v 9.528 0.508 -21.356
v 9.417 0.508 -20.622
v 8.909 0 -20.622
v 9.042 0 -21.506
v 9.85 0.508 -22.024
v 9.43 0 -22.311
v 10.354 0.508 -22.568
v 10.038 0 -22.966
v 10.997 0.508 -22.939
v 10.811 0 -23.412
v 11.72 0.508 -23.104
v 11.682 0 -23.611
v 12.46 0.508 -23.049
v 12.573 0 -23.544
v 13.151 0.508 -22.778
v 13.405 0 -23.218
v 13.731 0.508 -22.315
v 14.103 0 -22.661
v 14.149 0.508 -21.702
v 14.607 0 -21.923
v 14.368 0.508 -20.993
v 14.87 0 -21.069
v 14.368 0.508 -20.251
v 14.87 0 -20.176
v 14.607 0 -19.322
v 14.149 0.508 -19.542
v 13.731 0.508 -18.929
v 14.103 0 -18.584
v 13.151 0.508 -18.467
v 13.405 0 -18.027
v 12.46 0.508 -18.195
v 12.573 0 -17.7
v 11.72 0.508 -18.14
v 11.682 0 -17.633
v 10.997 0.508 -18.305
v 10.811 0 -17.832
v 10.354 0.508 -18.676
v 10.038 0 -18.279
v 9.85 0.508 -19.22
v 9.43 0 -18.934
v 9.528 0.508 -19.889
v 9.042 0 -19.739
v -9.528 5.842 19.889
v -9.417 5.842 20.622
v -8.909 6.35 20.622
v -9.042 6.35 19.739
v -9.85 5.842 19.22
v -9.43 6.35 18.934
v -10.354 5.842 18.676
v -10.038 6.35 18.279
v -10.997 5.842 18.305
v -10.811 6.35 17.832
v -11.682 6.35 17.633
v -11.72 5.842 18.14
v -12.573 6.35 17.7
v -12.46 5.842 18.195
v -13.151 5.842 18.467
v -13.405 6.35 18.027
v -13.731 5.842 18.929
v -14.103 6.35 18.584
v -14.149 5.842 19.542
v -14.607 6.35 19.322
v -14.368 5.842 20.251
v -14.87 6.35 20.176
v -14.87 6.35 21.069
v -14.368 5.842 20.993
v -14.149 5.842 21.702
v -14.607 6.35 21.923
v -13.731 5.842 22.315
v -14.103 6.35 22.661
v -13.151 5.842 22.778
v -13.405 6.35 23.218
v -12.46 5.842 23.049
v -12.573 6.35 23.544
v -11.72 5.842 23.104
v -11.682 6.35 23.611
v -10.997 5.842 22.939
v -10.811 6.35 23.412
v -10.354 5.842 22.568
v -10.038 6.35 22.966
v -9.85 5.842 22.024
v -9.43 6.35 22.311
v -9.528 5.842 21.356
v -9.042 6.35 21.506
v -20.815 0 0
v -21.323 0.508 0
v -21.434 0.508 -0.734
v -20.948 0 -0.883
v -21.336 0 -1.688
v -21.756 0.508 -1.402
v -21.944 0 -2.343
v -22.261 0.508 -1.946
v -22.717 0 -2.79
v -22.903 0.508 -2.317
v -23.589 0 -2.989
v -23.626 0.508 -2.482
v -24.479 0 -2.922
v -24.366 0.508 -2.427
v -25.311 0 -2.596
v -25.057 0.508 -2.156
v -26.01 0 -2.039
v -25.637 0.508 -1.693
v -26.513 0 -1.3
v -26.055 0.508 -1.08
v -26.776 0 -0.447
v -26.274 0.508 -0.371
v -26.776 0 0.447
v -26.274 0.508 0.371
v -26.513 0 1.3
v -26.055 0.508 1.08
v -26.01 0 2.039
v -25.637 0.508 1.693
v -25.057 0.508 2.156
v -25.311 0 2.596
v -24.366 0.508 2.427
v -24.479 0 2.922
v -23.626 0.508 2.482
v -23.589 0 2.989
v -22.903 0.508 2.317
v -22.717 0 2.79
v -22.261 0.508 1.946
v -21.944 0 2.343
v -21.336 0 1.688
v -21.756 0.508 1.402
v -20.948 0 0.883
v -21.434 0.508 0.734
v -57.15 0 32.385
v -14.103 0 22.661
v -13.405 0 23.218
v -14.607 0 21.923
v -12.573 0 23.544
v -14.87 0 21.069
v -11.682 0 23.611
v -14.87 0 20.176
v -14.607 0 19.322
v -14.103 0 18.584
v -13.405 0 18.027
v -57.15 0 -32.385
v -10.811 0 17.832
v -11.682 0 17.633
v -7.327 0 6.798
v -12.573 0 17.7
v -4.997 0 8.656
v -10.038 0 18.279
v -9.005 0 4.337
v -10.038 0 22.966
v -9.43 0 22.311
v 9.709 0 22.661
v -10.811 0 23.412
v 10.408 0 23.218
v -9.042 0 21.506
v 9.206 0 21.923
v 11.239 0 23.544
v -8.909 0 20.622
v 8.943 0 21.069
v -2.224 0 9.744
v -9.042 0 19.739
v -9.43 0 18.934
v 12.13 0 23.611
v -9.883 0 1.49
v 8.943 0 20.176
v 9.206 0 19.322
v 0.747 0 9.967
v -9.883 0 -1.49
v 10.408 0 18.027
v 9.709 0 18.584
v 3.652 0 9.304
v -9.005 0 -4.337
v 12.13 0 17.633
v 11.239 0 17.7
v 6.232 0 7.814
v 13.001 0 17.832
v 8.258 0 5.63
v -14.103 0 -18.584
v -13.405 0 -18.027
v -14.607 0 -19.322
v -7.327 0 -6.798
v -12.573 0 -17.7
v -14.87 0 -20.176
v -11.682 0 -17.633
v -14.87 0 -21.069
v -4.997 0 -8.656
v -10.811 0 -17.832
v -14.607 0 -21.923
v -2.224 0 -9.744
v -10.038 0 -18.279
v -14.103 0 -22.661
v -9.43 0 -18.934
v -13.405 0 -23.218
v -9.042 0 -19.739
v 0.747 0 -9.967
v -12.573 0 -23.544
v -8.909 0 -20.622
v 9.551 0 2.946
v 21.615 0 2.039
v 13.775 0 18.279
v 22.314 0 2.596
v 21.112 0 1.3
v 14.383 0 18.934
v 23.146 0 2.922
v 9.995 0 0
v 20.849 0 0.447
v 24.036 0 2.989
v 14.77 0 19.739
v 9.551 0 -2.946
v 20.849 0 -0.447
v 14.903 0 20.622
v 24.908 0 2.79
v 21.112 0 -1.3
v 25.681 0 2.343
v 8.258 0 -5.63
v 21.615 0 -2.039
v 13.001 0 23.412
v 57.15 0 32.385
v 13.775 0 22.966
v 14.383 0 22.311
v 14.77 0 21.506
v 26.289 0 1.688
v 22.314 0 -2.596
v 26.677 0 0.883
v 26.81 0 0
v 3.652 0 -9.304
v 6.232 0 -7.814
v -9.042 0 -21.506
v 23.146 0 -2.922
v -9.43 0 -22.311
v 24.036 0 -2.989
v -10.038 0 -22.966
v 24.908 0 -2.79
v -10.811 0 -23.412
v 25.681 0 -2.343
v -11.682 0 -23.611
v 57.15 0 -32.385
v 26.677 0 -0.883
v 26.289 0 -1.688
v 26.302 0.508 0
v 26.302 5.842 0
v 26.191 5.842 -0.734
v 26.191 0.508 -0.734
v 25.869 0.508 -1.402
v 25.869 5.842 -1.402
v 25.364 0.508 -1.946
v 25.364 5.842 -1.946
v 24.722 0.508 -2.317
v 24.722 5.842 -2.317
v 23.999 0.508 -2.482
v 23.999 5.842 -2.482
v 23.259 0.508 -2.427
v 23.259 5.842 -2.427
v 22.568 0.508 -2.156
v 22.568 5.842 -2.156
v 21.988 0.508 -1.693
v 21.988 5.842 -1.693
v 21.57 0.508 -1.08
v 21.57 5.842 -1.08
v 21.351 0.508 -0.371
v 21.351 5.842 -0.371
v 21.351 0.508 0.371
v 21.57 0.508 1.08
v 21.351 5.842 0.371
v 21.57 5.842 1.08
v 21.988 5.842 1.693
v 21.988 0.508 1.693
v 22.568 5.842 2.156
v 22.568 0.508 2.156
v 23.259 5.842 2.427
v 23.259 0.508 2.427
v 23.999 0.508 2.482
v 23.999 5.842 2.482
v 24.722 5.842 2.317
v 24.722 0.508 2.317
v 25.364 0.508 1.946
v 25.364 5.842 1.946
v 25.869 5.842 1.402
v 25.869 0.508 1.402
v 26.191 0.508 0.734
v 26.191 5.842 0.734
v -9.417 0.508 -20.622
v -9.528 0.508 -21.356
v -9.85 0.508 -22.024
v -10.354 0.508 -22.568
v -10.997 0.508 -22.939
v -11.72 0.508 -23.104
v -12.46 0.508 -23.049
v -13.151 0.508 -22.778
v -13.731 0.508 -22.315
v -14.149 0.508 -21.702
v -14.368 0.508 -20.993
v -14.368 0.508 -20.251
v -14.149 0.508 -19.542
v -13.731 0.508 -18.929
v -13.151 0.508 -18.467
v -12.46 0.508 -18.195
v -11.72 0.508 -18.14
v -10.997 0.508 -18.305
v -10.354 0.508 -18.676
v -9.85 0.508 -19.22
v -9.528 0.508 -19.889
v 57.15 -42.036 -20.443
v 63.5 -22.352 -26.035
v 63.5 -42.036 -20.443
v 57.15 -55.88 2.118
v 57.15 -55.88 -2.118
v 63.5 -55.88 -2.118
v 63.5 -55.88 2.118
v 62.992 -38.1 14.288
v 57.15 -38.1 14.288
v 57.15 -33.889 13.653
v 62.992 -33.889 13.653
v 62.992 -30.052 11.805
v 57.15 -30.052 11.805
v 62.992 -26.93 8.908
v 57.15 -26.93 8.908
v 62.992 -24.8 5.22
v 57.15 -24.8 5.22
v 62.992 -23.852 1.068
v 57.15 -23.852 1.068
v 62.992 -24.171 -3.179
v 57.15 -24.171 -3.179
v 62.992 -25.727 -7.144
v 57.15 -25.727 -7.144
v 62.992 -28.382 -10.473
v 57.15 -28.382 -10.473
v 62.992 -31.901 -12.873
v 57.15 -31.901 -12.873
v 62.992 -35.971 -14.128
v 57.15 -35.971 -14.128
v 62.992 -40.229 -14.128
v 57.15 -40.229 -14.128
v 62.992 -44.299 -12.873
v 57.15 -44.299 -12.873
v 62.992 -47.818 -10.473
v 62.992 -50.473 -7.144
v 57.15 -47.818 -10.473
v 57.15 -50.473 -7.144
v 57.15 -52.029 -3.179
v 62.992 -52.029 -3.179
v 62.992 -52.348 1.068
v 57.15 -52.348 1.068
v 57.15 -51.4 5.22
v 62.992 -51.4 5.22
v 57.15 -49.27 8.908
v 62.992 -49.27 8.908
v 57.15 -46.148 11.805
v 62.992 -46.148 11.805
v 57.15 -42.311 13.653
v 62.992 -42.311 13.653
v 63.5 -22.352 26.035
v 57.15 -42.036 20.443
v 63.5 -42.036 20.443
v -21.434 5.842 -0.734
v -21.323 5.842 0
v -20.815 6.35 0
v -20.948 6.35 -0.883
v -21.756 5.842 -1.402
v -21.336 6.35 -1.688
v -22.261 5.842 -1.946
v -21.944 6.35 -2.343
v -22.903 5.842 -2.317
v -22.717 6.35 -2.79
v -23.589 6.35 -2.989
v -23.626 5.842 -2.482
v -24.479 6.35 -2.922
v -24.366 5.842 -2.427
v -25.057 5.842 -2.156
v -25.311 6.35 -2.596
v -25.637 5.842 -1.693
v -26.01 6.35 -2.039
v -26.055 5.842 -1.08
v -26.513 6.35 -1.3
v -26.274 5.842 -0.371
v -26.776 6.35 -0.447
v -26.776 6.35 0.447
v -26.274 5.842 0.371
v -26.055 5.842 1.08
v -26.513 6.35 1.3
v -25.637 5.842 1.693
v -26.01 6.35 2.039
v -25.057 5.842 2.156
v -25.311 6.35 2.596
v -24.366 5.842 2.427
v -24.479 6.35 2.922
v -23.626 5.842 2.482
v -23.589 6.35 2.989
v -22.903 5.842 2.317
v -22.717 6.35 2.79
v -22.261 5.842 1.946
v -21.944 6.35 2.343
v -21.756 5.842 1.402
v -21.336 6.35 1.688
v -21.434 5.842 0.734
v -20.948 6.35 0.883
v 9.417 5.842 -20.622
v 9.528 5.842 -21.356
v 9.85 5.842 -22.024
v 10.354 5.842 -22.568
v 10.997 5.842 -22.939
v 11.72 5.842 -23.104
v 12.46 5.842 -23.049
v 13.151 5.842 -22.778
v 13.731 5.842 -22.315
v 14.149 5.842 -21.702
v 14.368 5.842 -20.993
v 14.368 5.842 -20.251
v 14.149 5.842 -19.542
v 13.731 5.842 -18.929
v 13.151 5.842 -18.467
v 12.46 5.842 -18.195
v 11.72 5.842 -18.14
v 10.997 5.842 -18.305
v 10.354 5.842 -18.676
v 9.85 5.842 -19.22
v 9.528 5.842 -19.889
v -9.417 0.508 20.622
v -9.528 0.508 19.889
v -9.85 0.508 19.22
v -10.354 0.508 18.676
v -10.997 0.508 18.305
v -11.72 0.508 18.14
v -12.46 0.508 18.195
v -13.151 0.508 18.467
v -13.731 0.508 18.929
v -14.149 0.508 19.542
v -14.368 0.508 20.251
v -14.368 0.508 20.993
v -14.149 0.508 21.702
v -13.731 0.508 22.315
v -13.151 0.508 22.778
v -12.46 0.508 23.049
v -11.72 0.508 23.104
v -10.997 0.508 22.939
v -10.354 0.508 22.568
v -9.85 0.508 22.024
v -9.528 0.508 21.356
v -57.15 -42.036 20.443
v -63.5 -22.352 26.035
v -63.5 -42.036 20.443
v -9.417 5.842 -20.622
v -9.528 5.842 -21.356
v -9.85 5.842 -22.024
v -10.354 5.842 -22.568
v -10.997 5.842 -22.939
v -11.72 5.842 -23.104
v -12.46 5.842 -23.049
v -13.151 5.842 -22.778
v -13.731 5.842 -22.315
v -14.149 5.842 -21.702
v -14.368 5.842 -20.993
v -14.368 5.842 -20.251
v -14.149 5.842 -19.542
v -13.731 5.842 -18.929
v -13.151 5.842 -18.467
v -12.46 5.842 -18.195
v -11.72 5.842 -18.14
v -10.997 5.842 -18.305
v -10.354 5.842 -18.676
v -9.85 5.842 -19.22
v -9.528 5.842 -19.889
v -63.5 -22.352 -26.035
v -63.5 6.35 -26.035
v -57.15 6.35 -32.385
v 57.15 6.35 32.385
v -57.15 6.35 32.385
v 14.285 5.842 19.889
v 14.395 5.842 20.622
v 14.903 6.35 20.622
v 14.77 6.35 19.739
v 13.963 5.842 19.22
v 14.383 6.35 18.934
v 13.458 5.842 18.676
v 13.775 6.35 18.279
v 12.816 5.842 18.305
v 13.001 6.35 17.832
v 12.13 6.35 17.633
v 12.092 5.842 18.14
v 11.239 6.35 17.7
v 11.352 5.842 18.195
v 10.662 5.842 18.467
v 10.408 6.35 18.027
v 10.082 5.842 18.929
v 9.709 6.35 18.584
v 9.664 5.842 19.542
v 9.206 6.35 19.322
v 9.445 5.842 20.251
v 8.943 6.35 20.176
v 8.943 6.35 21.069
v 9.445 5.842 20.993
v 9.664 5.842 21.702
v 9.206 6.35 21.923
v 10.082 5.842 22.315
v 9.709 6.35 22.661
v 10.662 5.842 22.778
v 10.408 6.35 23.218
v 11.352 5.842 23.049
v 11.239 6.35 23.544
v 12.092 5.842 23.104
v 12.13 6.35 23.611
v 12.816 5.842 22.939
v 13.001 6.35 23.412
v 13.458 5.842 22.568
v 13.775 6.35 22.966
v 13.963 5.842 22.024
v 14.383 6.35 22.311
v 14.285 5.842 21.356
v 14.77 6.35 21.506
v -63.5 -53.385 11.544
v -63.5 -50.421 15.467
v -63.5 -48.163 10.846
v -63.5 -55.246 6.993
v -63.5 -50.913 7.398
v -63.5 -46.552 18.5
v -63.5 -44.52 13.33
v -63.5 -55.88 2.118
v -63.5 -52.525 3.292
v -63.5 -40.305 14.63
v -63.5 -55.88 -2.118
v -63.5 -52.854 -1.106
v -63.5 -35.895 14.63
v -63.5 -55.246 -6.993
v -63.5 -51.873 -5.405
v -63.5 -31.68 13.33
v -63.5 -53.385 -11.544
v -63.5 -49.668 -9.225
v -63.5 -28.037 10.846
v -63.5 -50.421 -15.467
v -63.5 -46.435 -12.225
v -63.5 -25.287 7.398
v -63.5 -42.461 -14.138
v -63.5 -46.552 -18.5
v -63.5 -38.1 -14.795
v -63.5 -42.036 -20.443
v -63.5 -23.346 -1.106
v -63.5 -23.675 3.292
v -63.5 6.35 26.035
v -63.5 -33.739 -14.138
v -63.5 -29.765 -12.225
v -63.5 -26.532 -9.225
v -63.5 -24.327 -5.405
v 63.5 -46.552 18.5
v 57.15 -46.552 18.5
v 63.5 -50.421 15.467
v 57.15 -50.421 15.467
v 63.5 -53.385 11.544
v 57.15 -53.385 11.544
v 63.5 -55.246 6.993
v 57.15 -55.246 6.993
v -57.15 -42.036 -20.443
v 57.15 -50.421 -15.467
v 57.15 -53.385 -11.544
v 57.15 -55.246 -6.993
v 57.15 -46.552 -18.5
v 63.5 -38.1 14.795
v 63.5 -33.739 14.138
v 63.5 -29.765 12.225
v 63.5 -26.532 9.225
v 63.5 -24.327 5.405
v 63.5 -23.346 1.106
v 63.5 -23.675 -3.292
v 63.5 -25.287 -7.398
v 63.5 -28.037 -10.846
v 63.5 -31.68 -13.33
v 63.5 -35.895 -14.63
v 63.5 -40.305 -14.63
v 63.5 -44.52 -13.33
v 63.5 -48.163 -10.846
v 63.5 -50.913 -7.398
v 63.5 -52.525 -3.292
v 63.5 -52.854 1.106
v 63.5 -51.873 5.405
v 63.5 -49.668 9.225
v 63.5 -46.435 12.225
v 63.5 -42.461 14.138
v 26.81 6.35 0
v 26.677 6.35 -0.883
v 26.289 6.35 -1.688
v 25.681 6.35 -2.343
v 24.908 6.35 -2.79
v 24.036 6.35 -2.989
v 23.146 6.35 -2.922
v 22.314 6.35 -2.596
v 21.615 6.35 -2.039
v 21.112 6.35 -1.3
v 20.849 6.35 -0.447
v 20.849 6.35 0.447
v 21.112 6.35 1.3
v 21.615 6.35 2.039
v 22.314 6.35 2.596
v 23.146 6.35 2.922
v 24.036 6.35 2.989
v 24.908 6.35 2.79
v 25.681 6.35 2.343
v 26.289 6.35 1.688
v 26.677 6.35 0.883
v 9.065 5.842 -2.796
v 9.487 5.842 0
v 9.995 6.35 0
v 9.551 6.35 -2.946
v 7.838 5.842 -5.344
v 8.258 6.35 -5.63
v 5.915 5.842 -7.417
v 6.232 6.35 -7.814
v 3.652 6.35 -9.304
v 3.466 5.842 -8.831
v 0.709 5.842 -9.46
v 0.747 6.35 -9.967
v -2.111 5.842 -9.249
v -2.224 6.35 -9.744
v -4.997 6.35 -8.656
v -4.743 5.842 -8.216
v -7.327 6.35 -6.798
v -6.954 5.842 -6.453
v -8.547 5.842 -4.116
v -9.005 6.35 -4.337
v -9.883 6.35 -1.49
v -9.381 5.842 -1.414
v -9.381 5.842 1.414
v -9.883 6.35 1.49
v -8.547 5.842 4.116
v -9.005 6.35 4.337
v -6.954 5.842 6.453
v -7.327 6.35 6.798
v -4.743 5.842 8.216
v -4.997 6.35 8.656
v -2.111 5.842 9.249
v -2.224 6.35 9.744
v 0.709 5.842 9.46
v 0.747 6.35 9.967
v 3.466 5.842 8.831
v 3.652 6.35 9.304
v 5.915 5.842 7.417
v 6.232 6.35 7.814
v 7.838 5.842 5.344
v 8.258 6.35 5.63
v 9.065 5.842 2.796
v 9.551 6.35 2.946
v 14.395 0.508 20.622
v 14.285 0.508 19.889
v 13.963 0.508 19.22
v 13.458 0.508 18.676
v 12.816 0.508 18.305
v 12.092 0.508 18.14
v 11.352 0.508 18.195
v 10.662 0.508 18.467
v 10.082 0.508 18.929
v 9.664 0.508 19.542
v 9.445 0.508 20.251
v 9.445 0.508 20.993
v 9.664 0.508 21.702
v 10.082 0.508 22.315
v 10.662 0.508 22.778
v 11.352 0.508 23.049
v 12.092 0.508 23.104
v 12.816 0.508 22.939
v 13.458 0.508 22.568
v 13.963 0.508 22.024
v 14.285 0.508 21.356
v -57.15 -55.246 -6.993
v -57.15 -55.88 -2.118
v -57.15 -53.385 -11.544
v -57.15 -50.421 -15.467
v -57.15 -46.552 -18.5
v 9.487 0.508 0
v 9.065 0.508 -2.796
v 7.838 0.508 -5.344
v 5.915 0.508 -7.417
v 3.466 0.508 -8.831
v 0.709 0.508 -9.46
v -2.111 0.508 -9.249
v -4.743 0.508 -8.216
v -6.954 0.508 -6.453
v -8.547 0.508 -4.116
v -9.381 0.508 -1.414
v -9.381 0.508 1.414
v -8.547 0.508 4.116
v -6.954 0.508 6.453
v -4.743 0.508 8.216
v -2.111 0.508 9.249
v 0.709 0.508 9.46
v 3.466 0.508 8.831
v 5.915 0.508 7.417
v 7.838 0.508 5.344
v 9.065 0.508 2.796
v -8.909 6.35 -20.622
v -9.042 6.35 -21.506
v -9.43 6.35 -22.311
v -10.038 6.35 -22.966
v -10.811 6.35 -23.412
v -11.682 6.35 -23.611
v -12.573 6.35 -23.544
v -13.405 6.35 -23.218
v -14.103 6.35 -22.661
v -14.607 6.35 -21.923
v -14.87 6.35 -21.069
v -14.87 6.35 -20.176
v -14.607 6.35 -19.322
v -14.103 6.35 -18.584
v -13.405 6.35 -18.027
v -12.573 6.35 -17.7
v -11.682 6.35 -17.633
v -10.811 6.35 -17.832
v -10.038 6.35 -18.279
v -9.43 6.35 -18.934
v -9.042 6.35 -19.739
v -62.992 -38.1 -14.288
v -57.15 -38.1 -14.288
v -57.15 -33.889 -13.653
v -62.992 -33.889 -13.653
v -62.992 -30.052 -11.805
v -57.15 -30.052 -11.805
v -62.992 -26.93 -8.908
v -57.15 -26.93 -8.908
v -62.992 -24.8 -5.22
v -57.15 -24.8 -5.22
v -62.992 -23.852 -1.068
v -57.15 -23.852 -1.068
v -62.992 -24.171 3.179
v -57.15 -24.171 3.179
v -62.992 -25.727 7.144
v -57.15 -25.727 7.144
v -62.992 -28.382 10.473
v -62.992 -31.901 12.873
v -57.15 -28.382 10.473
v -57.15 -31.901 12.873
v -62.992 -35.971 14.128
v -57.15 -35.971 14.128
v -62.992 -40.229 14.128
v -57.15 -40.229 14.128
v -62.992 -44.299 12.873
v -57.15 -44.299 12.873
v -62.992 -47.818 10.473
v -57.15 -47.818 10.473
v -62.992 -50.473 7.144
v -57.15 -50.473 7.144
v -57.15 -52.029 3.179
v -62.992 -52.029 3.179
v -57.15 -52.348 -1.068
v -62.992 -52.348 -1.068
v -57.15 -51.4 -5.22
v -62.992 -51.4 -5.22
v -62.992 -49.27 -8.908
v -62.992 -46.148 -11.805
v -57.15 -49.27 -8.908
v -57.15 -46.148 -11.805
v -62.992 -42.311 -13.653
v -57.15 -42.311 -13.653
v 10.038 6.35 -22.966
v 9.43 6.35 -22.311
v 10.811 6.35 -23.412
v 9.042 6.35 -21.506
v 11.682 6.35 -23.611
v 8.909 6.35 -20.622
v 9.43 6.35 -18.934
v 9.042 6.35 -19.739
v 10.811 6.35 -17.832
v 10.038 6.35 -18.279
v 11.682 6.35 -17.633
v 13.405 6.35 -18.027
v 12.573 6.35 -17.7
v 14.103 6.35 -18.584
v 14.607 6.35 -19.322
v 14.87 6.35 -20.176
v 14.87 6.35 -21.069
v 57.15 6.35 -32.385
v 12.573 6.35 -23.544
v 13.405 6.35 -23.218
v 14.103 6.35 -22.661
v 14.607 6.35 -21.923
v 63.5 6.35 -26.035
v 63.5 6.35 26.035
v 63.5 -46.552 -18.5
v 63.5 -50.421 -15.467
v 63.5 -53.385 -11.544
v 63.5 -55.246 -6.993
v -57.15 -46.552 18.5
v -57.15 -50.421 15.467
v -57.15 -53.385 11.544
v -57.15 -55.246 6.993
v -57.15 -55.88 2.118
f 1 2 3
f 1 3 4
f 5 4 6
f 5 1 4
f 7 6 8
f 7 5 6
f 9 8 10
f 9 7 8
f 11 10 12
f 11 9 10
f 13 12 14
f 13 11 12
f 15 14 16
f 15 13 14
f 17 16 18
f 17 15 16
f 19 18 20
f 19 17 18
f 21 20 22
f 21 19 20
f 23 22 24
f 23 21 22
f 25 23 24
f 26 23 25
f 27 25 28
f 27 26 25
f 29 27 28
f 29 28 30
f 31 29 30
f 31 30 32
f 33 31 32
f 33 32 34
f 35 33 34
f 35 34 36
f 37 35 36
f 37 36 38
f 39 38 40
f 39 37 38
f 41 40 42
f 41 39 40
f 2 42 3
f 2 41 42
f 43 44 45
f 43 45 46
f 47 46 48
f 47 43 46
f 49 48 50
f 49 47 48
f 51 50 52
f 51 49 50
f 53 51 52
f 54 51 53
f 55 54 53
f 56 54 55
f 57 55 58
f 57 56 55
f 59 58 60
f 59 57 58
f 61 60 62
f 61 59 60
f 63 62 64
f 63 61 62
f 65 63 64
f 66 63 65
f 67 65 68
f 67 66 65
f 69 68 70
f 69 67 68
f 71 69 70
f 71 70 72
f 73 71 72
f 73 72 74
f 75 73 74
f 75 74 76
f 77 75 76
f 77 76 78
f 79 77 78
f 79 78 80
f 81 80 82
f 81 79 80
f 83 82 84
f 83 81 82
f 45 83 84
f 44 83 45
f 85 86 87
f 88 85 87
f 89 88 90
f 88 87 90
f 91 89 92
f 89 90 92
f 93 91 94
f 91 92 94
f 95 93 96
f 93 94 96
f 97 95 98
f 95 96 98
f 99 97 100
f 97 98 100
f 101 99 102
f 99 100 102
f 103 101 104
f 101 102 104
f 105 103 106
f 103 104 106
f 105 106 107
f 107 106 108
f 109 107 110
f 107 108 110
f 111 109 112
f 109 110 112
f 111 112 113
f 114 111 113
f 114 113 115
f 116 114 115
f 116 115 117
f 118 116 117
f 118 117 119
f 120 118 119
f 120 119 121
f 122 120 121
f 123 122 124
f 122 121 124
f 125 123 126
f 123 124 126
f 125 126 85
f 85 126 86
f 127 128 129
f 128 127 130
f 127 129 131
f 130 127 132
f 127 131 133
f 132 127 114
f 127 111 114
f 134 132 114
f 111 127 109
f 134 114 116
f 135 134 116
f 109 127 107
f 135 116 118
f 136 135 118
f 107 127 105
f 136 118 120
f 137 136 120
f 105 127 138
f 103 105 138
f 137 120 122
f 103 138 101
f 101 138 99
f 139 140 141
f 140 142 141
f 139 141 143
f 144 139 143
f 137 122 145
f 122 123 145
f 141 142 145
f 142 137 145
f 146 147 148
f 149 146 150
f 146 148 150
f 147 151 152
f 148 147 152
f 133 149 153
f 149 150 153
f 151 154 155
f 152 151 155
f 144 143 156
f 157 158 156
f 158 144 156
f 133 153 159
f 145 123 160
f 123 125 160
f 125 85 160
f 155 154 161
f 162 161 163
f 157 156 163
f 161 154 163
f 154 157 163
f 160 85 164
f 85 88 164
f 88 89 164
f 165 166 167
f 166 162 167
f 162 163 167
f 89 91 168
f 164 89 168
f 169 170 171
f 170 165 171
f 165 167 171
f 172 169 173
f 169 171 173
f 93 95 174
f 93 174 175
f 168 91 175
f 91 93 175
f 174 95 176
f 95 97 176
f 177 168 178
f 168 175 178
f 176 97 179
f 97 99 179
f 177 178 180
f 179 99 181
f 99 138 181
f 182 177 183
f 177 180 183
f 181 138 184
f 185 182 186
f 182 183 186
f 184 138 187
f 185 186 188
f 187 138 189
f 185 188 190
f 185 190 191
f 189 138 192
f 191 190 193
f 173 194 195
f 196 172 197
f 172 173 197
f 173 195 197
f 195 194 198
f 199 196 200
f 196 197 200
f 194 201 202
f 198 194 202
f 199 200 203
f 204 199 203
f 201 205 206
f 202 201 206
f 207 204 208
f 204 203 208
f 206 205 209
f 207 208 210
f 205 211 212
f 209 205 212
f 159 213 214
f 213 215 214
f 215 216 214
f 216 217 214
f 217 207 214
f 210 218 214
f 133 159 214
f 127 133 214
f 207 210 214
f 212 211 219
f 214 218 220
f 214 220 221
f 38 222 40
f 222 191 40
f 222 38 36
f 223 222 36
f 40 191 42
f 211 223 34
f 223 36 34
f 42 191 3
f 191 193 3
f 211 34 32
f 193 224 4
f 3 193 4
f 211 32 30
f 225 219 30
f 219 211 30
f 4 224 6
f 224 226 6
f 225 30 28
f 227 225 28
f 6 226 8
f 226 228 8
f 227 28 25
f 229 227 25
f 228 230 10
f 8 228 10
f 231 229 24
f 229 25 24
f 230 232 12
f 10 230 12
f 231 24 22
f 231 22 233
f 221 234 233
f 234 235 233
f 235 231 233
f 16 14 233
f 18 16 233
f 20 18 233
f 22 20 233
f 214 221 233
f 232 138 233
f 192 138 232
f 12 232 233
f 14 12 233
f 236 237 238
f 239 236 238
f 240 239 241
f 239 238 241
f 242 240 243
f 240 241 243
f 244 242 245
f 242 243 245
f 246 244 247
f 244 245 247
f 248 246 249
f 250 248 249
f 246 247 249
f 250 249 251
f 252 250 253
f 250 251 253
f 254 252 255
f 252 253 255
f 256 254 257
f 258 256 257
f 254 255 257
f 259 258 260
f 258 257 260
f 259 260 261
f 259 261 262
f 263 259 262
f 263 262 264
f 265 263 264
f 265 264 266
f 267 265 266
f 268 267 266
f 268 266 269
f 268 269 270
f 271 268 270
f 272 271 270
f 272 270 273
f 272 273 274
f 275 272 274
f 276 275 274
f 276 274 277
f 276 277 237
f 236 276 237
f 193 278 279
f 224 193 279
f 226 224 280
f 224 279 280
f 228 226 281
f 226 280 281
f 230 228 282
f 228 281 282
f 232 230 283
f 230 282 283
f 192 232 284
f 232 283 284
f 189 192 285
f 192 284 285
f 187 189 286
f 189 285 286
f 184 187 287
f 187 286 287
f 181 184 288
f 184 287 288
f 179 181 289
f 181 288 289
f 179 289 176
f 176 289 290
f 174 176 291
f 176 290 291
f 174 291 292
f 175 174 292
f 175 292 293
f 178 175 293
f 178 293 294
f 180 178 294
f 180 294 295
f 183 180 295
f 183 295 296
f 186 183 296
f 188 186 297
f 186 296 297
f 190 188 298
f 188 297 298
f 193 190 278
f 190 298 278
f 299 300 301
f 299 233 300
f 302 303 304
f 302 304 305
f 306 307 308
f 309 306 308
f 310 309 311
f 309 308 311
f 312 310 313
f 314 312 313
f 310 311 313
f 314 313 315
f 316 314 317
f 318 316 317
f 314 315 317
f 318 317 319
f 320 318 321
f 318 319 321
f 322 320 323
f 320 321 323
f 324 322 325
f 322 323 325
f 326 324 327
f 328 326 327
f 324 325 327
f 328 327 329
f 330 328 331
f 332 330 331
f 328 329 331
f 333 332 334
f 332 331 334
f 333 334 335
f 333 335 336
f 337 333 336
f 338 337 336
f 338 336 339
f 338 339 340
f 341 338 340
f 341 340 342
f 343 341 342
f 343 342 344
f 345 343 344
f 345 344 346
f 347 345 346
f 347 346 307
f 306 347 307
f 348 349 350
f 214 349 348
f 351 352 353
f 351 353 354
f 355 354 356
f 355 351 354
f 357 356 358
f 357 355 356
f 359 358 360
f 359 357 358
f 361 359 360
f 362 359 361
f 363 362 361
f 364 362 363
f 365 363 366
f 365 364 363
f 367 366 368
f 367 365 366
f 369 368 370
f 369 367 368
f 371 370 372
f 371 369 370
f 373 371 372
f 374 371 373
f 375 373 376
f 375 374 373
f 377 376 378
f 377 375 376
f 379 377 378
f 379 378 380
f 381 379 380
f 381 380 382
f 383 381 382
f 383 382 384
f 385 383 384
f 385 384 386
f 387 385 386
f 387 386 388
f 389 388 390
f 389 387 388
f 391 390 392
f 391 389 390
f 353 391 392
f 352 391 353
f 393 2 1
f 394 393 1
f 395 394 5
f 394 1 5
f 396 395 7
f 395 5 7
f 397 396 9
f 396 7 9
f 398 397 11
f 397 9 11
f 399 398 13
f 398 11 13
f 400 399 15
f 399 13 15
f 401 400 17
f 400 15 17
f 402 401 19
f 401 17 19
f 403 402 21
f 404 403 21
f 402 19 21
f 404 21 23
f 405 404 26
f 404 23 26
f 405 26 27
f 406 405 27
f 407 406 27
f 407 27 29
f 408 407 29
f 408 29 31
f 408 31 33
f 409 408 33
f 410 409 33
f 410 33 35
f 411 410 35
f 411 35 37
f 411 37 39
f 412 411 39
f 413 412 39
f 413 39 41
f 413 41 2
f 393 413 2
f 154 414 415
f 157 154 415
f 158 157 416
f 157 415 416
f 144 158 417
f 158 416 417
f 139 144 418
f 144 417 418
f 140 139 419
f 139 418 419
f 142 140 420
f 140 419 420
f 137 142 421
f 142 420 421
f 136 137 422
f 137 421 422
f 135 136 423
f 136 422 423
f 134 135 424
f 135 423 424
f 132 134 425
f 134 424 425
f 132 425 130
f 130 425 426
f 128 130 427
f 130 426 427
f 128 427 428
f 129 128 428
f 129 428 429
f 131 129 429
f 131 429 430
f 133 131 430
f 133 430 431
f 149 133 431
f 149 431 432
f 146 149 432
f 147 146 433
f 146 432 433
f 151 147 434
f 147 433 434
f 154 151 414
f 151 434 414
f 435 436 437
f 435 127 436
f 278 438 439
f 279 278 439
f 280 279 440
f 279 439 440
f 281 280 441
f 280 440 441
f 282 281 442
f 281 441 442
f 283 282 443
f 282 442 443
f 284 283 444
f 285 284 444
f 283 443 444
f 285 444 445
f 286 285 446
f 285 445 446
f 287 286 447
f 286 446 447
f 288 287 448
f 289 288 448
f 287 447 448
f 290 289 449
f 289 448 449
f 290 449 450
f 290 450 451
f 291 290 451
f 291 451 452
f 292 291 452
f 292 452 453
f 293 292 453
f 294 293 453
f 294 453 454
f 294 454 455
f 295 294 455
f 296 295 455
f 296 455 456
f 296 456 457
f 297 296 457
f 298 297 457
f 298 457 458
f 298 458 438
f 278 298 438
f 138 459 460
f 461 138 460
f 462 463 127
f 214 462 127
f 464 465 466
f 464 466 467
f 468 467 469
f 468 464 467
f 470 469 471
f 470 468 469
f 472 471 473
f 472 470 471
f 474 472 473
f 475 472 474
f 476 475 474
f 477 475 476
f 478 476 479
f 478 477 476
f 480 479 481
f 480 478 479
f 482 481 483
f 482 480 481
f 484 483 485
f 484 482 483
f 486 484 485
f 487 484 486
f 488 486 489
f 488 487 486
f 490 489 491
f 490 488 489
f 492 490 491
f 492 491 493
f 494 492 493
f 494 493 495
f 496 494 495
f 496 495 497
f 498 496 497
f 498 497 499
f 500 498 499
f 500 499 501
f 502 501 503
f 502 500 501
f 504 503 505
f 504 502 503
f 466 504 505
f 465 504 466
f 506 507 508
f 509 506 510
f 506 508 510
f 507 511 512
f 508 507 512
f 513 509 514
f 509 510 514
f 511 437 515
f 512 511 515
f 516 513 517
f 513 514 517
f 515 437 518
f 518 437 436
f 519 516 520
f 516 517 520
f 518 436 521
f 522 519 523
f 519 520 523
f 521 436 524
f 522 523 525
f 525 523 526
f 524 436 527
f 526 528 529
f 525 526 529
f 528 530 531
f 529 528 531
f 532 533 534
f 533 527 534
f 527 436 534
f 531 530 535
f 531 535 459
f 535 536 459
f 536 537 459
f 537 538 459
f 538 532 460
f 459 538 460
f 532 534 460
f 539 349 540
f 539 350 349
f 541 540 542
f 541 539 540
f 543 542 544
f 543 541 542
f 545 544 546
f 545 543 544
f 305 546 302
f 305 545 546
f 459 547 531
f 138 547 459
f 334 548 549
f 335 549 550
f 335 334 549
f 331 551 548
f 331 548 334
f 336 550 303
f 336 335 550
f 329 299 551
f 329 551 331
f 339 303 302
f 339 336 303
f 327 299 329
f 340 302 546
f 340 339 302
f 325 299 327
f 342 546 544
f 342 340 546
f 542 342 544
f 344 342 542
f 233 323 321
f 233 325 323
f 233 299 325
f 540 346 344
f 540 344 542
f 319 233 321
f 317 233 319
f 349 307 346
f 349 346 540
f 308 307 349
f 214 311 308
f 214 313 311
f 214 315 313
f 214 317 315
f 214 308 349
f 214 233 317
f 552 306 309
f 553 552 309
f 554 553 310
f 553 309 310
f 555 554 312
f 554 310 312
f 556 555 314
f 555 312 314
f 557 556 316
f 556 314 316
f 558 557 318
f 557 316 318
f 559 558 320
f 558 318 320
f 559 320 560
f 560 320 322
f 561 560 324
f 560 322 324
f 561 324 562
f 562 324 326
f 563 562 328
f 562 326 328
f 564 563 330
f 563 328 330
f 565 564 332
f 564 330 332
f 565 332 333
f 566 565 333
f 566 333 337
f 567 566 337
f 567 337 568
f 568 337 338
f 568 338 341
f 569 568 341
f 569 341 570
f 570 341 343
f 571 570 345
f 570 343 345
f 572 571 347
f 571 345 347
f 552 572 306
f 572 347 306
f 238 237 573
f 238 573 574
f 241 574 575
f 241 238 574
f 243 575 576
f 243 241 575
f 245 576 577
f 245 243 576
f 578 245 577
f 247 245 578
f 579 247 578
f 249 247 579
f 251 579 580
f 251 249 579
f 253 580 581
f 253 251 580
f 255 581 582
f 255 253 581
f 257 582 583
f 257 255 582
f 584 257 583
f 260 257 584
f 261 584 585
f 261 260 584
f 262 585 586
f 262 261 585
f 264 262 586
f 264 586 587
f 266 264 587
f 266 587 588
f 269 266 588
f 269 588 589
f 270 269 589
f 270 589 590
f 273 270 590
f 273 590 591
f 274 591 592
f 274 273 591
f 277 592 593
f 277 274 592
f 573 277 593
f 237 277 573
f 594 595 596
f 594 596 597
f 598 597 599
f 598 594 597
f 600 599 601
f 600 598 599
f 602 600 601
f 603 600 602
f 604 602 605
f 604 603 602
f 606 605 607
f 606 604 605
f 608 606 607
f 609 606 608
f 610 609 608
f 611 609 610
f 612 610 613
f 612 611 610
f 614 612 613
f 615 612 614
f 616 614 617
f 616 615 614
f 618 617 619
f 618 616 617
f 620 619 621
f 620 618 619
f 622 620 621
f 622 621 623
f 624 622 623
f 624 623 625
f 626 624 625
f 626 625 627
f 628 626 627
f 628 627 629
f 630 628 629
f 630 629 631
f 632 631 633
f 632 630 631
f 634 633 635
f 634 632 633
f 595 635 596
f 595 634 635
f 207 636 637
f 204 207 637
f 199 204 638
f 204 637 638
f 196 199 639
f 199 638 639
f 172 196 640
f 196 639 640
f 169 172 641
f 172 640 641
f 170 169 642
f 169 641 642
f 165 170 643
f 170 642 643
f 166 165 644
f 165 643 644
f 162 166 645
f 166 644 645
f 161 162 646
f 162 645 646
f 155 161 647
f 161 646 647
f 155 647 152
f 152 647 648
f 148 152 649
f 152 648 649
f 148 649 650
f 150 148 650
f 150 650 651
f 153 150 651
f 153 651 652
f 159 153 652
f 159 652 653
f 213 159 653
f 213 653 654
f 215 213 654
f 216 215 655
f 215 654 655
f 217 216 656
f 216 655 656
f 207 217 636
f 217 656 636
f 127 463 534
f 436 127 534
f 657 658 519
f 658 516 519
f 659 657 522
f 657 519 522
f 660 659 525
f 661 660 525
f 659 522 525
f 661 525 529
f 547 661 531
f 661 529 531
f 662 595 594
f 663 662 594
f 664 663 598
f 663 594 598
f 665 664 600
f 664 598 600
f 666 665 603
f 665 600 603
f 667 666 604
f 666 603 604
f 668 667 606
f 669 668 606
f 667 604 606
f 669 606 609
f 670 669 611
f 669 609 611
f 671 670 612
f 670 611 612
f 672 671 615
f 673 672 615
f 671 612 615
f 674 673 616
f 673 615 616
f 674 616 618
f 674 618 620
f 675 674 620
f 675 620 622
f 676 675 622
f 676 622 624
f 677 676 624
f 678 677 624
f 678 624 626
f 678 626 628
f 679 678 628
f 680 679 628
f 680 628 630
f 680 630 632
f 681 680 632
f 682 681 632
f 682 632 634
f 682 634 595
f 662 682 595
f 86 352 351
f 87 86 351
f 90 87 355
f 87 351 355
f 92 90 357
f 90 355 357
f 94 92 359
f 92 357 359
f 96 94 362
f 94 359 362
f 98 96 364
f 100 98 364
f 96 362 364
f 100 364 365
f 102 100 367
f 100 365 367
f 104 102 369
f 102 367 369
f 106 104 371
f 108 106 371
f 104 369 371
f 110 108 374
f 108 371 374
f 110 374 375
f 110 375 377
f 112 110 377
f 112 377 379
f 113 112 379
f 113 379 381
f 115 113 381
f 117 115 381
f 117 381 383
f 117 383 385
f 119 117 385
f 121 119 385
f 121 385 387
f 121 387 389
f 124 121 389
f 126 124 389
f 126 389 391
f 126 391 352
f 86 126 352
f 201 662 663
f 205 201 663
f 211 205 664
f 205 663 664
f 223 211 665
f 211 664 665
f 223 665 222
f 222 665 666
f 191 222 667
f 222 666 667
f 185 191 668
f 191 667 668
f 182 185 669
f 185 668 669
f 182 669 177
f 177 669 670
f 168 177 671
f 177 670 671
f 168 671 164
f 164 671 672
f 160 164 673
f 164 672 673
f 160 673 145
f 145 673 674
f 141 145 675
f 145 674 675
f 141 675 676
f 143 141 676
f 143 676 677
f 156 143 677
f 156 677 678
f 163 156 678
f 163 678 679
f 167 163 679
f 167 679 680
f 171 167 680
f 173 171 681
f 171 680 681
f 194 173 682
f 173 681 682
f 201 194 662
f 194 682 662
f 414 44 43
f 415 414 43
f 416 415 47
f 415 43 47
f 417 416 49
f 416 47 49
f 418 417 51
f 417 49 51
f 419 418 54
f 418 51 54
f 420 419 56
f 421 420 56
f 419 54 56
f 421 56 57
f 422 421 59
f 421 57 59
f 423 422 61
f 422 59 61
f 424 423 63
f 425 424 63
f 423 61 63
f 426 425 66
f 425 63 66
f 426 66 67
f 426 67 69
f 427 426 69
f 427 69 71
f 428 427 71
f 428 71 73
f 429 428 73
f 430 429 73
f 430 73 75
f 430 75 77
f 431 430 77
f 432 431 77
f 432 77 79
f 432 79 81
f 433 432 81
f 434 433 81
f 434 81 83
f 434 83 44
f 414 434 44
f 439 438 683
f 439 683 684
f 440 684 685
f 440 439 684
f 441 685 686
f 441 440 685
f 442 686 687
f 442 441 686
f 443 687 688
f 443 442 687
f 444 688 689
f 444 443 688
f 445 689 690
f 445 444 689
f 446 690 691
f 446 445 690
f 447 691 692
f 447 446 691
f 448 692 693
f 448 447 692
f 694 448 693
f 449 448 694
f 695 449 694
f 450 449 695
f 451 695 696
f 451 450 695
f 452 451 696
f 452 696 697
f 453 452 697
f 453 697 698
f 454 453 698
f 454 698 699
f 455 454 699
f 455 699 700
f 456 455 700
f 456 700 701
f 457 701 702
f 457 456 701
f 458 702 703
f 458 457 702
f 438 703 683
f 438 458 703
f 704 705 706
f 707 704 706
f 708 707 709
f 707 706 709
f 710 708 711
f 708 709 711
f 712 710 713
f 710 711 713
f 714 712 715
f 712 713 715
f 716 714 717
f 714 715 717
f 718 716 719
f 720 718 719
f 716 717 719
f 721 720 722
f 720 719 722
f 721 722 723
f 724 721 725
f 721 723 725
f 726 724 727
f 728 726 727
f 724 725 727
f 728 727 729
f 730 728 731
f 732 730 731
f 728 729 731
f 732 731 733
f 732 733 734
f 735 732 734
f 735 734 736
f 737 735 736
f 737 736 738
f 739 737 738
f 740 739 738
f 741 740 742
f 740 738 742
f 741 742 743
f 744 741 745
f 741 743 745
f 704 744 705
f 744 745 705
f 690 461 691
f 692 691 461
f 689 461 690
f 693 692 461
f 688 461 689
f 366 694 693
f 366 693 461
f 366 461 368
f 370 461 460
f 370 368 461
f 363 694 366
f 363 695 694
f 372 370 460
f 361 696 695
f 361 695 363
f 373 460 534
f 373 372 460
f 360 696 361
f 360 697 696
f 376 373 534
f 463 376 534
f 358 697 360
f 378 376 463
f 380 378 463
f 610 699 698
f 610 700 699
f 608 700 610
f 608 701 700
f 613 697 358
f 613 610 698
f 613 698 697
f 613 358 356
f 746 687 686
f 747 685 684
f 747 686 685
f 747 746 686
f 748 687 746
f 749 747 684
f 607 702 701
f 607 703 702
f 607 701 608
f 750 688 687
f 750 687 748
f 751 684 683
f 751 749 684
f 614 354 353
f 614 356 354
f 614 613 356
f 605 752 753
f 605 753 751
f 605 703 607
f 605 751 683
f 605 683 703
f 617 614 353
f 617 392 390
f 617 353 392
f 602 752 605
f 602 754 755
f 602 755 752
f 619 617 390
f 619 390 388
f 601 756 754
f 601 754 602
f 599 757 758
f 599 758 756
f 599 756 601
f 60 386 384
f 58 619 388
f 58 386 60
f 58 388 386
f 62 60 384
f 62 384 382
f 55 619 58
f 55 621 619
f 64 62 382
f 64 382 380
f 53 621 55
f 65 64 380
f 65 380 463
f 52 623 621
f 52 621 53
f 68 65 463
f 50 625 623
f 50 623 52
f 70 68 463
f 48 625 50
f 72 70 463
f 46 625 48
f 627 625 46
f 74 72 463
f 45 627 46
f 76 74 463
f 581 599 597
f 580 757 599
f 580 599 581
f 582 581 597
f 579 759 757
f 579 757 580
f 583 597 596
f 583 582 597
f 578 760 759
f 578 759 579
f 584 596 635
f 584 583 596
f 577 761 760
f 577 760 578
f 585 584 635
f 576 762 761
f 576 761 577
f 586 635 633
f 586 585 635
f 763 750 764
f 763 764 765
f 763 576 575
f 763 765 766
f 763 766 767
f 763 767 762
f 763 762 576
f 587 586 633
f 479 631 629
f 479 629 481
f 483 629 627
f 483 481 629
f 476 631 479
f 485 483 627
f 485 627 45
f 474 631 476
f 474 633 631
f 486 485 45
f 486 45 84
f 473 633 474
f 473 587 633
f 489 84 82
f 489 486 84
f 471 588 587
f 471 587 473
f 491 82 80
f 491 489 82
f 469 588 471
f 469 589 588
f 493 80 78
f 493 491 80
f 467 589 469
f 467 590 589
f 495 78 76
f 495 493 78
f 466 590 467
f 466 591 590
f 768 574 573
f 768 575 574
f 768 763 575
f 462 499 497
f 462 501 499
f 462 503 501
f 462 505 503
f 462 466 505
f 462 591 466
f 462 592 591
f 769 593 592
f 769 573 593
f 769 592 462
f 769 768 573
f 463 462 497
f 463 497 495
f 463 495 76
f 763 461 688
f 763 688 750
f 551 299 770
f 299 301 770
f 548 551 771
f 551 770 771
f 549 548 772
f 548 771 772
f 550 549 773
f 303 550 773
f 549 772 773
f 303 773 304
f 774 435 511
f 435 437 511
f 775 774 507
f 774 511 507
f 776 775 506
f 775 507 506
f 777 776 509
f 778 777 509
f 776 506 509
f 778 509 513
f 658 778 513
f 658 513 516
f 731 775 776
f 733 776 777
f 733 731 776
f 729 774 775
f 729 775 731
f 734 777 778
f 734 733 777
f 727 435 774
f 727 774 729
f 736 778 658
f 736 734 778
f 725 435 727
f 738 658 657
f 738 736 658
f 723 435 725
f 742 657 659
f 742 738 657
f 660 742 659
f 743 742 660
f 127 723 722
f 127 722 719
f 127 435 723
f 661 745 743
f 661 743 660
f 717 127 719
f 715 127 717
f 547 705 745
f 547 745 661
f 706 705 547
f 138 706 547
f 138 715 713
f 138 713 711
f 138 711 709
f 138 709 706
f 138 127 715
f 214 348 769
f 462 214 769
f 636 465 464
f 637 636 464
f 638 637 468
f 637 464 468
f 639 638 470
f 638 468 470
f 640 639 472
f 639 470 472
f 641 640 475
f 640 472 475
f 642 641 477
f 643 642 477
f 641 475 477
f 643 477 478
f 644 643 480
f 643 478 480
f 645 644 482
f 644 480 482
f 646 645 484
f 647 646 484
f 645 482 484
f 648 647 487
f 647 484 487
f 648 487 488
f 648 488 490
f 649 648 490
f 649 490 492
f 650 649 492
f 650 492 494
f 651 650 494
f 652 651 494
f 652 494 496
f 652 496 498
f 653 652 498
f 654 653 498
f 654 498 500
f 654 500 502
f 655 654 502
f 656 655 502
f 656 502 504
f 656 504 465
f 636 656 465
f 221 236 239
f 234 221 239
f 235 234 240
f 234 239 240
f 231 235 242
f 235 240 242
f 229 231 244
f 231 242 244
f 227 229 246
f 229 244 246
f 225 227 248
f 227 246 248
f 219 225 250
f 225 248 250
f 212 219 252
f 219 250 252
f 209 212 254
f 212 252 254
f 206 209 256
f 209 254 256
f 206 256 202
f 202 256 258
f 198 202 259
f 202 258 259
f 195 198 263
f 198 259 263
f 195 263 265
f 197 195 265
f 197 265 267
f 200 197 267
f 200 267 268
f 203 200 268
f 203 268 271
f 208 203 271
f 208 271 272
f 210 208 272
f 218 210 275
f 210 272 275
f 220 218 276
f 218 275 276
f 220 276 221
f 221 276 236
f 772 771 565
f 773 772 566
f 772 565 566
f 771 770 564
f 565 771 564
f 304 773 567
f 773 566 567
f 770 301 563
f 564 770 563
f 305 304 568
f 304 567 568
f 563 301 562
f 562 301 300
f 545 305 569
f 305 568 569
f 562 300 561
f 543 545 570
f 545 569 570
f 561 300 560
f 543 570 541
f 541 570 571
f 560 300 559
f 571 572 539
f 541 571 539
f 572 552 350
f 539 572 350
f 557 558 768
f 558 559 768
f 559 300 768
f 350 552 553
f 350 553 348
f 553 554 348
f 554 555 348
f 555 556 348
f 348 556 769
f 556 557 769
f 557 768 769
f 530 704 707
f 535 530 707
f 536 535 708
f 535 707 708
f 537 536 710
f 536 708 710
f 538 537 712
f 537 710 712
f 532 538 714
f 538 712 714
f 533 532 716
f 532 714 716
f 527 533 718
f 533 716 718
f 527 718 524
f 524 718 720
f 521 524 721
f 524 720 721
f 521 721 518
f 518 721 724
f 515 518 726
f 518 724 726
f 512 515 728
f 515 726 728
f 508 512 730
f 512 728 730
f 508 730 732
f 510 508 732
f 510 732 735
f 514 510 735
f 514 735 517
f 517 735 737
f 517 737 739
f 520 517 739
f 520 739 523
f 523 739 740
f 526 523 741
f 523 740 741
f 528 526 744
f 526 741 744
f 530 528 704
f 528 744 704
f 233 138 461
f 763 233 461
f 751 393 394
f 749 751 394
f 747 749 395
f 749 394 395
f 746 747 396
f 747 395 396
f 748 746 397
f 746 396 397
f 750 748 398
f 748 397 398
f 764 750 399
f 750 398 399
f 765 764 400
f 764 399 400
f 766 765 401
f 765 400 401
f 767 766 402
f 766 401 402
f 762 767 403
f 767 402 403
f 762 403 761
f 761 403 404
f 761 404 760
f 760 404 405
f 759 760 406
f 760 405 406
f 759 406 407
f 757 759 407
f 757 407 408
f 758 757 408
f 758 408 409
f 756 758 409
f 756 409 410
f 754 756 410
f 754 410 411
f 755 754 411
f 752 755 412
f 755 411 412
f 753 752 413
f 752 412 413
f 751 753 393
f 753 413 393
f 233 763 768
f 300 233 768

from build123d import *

# Parameters (mm, degrees)
SKETCH1_W                      = 114.3
SKETCH1_H                      = 64.77
BOSS_EXTRUDE1_DEPTH            = 6.35
BOSS_EXTRUDE2_DEPTH            = 6.35
BOSS_EXTRUDE3_DEPTH            = 6.35
HOLE1_D                        = 18.9738
HOLE1_DEPTH                    = 6.35
F_9_0_196_DIAMETER_HOLE1_D     = 4.9784
F_9_0_196_DIAMETER_HOLE1_DEPTH = 62.23
F_9_0_196_DIAMETER_HOLE2_D     = 4.9784
F_9_0_196_DIAMETER_HOLE2_DEPTH = 6.35
HOLE2_D                        = 28.575
HOLE2_DEPTH                    = 6.35
HOLE3_D                        = 28.575
HOLE3_DEPTH                    = 127
CHAMFER1_SIZE                  = 6.35
CHAMFER2_SIZE                  = 0.508
FILLET1_R                      = 19.05


with BuildPart() as part:
    # Sketch1 → Boss-Extrude1 (new body)
    with BuildSketch(Plane(origin=(0, 6.35, 0), x_dir=(1, 0, 0), z_dir=(0, 1, 0))):
        Rectangle(SKETCH1_W, SKETCH1_H)
    extrude(amount=-BOSS_EXTRUDE1_DEPTH)

    # Sketch2 → Boss-Extrude2 (add)
    with BuildSketch(Plane(origin=(57.15, 0, 0), x_dir=(0, 0, -1), z_dir=(1, 0, 0))):
        Polygon((-32.385, 6.35), (32.385, 6.35), (32.385, 0), (16.51, -55.88), (-16.51, -55.88), (-32.385, 0), align=None)
    extrude(amount=BOSS_EXTRUDE2_DEPTH)

    # Sketch3 → Boss-Extrude3 (add)
    with BuildSketch(Plane.ZY.offset(57.15)):
        Polygon((32.385, 0), (16.51, -55.88), (-16.51, -55.88), (-32.385, 0), (-32.385, 6.35), (32.385, 6.35), align=None)
    extrude(amount=BOSS_EXTRUDE3_DEPTH)

    # Hole1
    with Locations(Plane(origin=(0, 0, 0), x_dir=(-1, 0, 0), z_dir=(0, -1, 0))):
        with Locations((0, 0)):
            Hole(HOLE1_D / 2, depth=HOLE1_DEPTH)

    # #9 (0.196) Diameter Hole1
    with Locations(Plane(origin=(0, 6.35, 0), x_dir=(1, 0, 0), z_dir=(0, 1, 0))):
        with Locations((11.90625, 20.622229928)):
            Hole(F_9_0_196_DIAMETER_HOLE1_D / 2, depth=F_9_0_196_DIAMETER_HOLE1_DEPTH)

    # #9 (0.196) Diameter Hole2
    with Locations(Plane(origin=(0, 0, 0), x_dir=(-1, 0, 0), z_dir=(0, -1, 0))):
        with Locations((-23.8125, 0), (-11.90625, -20.622229928), (11.90625, -20.622229928), (23.8125, 0), (11.90625, 20.622229928)):
            Hole(F_9_0_196_DIAMETER_HOLE2_D / 2, depth=F_9_0_196_DIAMETER_HOLE2_DEPTH)

    # Hole2
    with Locations(Plane.ZY.offset(63.5)):
        with Locations((0, -38.1)):
            Hole(HOLE2_D / 2, depth=HOLE2_DEPTH)

    # Hole3
    with Locations(Plane(origin=(63.5, 0, 0), x_dir=(0, 0, -1), z_dir=(1, 0, 0))):
        with Locations((0, -38.1)):
            Hole(HOLE3_D / 2, depth=HOLE3_DEPTH)

    # Chamfer1
    chamfer1_edges = [part.edges().sort_by_distance(p)[0] for p in [
        (63.5, 3.175, -32.385),
        (63.5, 3.175, 32.385),
        (-63.5, 3.175, -32.385),
        (-63.5, 3.175, 32.385),
    ]]
    chamfer(chamfer1_edges, length=CHAMFER1_SIZE)

    # Chamfer2
    chamfer2_edges = [part.edges().sort_by_distance(p)[0] for p in [
        (-9.4869, 0, 0),
        (-9.4869, 6.35, 0),
        (14.39545, 0, -20.622229928),
        (14.39545, 6.35, -20.622229928),
        (-14.39545, 0, -20.622229928),
        (-14.39545, 6.35, -20.622229928),
        (-26.3017, 0, 0),
        (-26.3017, 6.35, 0),
        (-14.39545, 0, 20.622229928),
        (-14.39545, 6.35, 20.622229928),
        (9.41705, 0, 20.622229928),
        (9.41705, 6.35, 20.622229928),
        (21.3233, 0, 0),
        (21.3233, 6.35, 0),
        (-63.5, -38.1, 14.2875),
        (63.5, -38.1, -14.2875),
    ]]
    chamfer(chamfer2_edges, length=CHAMFER2_SIZE)

    # Fillet1
    fillet1_edges = [part.edges().sort_by_distance(p)[0] for p in [
        (60.325, -55.88, 16.51),
        (60.325, -55.88, -16.51),
        (-60.325, -55.88, -16.51),
        (-60.325, -55.88, 16.51),
    ]]
    fillet(fillet1_edges, radius=FILLET1_R)


solid = part.part
